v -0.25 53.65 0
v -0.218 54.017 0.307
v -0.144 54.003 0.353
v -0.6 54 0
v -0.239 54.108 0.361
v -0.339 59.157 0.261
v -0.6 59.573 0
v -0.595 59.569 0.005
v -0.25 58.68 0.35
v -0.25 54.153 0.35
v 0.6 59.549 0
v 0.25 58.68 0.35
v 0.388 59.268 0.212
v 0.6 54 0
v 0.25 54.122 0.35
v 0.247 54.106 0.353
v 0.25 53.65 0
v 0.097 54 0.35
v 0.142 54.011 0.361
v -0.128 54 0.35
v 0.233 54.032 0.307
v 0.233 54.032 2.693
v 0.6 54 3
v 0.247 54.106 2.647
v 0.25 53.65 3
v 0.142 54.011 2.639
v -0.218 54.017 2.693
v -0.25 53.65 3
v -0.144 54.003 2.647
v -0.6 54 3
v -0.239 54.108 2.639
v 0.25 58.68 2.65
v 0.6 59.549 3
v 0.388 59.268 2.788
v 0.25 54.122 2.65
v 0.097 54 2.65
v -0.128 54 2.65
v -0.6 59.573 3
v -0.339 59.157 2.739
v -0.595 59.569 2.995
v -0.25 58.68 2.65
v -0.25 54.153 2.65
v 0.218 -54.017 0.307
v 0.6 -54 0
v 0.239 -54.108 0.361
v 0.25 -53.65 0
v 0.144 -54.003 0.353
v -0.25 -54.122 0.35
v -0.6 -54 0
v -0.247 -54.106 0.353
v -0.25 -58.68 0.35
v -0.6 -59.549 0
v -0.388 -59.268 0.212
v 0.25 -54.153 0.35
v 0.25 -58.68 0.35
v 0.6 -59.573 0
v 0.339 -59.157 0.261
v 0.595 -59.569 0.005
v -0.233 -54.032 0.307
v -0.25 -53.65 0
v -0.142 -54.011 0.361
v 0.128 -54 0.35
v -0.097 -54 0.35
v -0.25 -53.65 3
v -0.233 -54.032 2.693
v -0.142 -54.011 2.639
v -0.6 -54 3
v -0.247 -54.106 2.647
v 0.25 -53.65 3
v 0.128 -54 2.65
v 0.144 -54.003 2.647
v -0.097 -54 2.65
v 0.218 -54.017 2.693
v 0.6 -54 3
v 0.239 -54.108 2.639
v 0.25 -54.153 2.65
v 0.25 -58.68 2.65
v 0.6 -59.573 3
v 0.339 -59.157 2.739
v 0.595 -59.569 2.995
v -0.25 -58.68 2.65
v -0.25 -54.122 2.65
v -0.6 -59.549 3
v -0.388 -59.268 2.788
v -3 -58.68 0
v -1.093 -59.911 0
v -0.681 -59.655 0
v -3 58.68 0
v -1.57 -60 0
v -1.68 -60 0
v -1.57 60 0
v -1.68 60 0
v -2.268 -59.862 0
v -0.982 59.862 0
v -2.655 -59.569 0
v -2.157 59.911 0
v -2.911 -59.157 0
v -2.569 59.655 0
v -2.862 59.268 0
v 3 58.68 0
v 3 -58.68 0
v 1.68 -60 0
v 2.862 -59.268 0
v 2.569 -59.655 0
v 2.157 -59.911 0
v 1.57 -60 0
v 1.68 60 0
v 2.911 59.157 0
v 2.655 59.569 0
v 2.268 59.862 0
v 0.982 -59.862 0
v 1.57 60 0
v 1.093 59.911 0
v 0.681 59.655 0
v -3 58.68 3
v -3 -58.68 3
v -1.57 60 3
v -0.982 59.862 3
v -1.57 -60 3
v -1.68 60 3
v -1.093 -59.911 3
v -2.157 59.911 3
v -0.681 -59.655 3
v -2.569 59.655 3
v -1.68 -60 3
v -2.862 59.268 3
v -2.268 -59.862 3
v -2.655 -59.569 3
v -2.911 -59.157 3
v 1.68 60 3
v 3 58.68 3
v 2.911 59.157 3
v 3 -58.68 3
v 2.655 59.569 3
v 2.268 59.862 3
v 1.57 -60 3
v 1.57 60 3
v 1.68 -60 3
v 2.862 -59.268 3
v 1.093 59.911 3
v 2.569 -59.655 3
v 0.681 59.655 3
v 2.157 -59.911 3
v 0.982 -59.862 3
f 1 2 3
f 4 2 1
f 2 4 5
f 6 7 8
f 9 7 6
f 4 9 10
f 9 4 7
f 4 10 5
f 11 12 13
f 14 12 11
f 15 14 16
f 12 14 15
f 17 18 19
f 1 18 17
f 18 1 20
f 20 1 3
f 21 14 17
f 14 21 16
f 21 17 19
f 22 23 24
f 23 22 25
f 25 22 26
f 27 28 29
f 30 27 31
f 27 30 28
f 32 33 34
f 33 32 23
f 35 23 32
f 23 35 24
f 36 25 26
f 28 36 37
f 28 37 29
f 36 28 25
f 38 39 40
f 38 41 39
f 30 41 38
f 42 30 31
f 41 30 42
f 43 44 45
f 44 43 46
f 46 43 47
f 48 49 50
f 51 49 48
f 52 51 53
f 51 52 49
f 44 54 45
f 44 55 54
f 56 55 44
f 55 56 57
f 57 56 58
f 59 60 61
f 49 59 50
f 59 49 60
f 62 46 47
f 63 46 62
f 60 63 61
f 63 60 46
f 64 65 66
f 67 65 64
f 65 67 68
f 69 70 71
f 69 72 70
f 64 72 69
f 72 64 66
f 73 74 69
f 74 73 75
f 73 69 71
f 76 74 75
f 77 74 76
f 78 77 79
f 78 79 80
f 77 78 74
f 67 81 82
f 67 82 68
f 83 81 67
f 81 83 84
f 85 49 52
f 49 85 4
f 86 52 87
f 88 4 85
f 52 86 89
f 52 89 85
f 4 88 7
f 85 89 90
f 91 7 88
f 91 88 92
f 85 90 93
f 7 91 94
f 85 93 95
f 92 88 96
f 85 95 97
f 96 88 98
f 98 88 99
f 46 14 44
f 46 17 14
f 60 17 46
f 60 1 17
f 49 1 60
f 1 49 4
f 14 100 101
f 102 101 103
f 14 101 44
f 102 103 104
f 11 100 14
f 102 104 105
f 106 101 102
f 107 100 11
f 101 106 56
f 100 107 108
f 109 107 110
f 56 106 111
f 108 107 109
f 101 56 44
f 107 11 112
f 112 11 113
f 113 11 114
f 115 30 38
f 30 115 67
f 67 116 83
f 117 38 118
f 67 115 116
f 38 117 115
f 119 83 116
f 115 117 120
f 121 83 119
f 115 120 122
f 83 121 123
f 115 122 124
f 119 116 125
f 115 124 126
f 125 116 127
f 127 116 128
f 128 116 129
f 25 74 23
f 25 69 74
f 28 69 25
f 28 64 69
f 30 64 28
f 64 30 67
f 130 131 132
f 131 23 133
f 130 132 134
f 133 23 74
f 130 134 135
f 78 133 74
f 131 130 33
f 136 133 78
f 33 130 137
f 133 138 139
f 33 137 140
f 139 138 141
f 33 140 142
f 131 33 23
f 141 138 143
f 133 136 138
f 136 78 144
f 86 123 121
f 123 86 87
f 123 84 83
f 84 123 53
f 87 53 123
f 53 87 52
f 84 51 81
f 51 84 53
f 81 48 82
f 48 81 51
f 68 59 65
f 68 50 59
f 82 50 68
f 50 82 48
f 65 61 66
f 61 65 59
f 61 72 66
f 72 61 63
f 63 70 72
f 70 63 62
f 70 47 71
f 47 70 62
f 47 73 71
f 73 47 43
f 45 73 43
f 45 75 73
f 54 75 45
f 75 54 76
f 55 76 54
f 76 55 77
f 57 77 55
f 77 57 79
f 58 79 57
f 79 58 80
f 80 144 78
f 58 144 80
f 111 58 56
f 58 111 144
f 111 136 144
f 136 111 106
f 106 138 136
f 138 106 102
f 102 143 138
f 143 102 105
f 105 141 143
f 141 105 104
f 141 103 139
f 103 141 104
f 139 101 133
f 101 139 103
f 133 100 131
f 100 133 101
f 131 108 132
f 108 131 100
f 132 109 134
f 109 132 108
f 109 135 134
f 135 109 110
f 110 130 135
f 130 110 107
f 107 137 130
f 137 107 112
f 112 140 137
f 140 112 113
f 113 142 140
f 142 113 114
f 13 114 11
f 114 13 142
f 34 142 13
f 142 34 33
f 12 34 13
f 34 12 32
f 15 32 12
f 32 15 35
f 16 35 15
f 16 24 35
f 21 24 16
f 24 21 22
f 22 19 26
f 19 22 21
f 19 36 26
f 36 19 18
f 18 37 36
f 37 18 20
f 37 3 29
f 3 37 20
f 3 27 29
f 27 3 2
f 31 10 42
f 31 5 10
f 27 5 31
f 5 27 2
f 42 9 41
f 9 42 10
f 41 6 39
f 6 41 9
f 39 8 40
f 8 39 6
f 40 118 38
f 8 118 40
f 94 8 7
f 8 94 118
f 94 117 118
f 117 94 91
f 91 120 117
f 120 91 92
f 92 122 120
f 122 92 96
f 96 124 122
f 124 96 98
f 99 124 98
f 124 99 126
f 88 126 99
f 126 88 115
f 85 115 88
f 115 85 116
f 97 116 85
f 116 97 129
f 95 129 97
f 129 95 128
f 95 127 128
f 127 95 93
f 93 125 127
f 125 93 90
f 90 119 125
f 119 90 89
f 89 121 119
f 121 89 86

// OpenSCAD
//Program to print tensegrity beam
//File name: tensegrityBeam.scad

l = 120; // length of the rod
w = 6; // width of the rod, mm
h = 3; // depth in third dimension
hole = .5; // parameter to round off the edges of the slot 

$fs = .5;
$fa = 2;

difference() {
  linear_extrude(h, convexity = 5) offset((w - hole) * .24) offset((w - hole) * -.24) difference() {
    square([w, l], center = true);
    for(i = [1, -1]) translate([0, i * l / 2, 0]) square([hole, w * 2], center = true);
  }
  for(i = [1, -1], j = [0, 1]) {
    translate([0, 0, h / 2]) mirror([0, 0, j]) translate([0, i * l / 2, -h / 2 - 1]) hull() {
      linear_extrude(1 + hole) offset(-hole/2 + .1) square([hole, w * 2], center = true);
      linear_extrude(1) offset(hole/2 + .1) square([hole, w * 2], center = true);
    }
  }
}
